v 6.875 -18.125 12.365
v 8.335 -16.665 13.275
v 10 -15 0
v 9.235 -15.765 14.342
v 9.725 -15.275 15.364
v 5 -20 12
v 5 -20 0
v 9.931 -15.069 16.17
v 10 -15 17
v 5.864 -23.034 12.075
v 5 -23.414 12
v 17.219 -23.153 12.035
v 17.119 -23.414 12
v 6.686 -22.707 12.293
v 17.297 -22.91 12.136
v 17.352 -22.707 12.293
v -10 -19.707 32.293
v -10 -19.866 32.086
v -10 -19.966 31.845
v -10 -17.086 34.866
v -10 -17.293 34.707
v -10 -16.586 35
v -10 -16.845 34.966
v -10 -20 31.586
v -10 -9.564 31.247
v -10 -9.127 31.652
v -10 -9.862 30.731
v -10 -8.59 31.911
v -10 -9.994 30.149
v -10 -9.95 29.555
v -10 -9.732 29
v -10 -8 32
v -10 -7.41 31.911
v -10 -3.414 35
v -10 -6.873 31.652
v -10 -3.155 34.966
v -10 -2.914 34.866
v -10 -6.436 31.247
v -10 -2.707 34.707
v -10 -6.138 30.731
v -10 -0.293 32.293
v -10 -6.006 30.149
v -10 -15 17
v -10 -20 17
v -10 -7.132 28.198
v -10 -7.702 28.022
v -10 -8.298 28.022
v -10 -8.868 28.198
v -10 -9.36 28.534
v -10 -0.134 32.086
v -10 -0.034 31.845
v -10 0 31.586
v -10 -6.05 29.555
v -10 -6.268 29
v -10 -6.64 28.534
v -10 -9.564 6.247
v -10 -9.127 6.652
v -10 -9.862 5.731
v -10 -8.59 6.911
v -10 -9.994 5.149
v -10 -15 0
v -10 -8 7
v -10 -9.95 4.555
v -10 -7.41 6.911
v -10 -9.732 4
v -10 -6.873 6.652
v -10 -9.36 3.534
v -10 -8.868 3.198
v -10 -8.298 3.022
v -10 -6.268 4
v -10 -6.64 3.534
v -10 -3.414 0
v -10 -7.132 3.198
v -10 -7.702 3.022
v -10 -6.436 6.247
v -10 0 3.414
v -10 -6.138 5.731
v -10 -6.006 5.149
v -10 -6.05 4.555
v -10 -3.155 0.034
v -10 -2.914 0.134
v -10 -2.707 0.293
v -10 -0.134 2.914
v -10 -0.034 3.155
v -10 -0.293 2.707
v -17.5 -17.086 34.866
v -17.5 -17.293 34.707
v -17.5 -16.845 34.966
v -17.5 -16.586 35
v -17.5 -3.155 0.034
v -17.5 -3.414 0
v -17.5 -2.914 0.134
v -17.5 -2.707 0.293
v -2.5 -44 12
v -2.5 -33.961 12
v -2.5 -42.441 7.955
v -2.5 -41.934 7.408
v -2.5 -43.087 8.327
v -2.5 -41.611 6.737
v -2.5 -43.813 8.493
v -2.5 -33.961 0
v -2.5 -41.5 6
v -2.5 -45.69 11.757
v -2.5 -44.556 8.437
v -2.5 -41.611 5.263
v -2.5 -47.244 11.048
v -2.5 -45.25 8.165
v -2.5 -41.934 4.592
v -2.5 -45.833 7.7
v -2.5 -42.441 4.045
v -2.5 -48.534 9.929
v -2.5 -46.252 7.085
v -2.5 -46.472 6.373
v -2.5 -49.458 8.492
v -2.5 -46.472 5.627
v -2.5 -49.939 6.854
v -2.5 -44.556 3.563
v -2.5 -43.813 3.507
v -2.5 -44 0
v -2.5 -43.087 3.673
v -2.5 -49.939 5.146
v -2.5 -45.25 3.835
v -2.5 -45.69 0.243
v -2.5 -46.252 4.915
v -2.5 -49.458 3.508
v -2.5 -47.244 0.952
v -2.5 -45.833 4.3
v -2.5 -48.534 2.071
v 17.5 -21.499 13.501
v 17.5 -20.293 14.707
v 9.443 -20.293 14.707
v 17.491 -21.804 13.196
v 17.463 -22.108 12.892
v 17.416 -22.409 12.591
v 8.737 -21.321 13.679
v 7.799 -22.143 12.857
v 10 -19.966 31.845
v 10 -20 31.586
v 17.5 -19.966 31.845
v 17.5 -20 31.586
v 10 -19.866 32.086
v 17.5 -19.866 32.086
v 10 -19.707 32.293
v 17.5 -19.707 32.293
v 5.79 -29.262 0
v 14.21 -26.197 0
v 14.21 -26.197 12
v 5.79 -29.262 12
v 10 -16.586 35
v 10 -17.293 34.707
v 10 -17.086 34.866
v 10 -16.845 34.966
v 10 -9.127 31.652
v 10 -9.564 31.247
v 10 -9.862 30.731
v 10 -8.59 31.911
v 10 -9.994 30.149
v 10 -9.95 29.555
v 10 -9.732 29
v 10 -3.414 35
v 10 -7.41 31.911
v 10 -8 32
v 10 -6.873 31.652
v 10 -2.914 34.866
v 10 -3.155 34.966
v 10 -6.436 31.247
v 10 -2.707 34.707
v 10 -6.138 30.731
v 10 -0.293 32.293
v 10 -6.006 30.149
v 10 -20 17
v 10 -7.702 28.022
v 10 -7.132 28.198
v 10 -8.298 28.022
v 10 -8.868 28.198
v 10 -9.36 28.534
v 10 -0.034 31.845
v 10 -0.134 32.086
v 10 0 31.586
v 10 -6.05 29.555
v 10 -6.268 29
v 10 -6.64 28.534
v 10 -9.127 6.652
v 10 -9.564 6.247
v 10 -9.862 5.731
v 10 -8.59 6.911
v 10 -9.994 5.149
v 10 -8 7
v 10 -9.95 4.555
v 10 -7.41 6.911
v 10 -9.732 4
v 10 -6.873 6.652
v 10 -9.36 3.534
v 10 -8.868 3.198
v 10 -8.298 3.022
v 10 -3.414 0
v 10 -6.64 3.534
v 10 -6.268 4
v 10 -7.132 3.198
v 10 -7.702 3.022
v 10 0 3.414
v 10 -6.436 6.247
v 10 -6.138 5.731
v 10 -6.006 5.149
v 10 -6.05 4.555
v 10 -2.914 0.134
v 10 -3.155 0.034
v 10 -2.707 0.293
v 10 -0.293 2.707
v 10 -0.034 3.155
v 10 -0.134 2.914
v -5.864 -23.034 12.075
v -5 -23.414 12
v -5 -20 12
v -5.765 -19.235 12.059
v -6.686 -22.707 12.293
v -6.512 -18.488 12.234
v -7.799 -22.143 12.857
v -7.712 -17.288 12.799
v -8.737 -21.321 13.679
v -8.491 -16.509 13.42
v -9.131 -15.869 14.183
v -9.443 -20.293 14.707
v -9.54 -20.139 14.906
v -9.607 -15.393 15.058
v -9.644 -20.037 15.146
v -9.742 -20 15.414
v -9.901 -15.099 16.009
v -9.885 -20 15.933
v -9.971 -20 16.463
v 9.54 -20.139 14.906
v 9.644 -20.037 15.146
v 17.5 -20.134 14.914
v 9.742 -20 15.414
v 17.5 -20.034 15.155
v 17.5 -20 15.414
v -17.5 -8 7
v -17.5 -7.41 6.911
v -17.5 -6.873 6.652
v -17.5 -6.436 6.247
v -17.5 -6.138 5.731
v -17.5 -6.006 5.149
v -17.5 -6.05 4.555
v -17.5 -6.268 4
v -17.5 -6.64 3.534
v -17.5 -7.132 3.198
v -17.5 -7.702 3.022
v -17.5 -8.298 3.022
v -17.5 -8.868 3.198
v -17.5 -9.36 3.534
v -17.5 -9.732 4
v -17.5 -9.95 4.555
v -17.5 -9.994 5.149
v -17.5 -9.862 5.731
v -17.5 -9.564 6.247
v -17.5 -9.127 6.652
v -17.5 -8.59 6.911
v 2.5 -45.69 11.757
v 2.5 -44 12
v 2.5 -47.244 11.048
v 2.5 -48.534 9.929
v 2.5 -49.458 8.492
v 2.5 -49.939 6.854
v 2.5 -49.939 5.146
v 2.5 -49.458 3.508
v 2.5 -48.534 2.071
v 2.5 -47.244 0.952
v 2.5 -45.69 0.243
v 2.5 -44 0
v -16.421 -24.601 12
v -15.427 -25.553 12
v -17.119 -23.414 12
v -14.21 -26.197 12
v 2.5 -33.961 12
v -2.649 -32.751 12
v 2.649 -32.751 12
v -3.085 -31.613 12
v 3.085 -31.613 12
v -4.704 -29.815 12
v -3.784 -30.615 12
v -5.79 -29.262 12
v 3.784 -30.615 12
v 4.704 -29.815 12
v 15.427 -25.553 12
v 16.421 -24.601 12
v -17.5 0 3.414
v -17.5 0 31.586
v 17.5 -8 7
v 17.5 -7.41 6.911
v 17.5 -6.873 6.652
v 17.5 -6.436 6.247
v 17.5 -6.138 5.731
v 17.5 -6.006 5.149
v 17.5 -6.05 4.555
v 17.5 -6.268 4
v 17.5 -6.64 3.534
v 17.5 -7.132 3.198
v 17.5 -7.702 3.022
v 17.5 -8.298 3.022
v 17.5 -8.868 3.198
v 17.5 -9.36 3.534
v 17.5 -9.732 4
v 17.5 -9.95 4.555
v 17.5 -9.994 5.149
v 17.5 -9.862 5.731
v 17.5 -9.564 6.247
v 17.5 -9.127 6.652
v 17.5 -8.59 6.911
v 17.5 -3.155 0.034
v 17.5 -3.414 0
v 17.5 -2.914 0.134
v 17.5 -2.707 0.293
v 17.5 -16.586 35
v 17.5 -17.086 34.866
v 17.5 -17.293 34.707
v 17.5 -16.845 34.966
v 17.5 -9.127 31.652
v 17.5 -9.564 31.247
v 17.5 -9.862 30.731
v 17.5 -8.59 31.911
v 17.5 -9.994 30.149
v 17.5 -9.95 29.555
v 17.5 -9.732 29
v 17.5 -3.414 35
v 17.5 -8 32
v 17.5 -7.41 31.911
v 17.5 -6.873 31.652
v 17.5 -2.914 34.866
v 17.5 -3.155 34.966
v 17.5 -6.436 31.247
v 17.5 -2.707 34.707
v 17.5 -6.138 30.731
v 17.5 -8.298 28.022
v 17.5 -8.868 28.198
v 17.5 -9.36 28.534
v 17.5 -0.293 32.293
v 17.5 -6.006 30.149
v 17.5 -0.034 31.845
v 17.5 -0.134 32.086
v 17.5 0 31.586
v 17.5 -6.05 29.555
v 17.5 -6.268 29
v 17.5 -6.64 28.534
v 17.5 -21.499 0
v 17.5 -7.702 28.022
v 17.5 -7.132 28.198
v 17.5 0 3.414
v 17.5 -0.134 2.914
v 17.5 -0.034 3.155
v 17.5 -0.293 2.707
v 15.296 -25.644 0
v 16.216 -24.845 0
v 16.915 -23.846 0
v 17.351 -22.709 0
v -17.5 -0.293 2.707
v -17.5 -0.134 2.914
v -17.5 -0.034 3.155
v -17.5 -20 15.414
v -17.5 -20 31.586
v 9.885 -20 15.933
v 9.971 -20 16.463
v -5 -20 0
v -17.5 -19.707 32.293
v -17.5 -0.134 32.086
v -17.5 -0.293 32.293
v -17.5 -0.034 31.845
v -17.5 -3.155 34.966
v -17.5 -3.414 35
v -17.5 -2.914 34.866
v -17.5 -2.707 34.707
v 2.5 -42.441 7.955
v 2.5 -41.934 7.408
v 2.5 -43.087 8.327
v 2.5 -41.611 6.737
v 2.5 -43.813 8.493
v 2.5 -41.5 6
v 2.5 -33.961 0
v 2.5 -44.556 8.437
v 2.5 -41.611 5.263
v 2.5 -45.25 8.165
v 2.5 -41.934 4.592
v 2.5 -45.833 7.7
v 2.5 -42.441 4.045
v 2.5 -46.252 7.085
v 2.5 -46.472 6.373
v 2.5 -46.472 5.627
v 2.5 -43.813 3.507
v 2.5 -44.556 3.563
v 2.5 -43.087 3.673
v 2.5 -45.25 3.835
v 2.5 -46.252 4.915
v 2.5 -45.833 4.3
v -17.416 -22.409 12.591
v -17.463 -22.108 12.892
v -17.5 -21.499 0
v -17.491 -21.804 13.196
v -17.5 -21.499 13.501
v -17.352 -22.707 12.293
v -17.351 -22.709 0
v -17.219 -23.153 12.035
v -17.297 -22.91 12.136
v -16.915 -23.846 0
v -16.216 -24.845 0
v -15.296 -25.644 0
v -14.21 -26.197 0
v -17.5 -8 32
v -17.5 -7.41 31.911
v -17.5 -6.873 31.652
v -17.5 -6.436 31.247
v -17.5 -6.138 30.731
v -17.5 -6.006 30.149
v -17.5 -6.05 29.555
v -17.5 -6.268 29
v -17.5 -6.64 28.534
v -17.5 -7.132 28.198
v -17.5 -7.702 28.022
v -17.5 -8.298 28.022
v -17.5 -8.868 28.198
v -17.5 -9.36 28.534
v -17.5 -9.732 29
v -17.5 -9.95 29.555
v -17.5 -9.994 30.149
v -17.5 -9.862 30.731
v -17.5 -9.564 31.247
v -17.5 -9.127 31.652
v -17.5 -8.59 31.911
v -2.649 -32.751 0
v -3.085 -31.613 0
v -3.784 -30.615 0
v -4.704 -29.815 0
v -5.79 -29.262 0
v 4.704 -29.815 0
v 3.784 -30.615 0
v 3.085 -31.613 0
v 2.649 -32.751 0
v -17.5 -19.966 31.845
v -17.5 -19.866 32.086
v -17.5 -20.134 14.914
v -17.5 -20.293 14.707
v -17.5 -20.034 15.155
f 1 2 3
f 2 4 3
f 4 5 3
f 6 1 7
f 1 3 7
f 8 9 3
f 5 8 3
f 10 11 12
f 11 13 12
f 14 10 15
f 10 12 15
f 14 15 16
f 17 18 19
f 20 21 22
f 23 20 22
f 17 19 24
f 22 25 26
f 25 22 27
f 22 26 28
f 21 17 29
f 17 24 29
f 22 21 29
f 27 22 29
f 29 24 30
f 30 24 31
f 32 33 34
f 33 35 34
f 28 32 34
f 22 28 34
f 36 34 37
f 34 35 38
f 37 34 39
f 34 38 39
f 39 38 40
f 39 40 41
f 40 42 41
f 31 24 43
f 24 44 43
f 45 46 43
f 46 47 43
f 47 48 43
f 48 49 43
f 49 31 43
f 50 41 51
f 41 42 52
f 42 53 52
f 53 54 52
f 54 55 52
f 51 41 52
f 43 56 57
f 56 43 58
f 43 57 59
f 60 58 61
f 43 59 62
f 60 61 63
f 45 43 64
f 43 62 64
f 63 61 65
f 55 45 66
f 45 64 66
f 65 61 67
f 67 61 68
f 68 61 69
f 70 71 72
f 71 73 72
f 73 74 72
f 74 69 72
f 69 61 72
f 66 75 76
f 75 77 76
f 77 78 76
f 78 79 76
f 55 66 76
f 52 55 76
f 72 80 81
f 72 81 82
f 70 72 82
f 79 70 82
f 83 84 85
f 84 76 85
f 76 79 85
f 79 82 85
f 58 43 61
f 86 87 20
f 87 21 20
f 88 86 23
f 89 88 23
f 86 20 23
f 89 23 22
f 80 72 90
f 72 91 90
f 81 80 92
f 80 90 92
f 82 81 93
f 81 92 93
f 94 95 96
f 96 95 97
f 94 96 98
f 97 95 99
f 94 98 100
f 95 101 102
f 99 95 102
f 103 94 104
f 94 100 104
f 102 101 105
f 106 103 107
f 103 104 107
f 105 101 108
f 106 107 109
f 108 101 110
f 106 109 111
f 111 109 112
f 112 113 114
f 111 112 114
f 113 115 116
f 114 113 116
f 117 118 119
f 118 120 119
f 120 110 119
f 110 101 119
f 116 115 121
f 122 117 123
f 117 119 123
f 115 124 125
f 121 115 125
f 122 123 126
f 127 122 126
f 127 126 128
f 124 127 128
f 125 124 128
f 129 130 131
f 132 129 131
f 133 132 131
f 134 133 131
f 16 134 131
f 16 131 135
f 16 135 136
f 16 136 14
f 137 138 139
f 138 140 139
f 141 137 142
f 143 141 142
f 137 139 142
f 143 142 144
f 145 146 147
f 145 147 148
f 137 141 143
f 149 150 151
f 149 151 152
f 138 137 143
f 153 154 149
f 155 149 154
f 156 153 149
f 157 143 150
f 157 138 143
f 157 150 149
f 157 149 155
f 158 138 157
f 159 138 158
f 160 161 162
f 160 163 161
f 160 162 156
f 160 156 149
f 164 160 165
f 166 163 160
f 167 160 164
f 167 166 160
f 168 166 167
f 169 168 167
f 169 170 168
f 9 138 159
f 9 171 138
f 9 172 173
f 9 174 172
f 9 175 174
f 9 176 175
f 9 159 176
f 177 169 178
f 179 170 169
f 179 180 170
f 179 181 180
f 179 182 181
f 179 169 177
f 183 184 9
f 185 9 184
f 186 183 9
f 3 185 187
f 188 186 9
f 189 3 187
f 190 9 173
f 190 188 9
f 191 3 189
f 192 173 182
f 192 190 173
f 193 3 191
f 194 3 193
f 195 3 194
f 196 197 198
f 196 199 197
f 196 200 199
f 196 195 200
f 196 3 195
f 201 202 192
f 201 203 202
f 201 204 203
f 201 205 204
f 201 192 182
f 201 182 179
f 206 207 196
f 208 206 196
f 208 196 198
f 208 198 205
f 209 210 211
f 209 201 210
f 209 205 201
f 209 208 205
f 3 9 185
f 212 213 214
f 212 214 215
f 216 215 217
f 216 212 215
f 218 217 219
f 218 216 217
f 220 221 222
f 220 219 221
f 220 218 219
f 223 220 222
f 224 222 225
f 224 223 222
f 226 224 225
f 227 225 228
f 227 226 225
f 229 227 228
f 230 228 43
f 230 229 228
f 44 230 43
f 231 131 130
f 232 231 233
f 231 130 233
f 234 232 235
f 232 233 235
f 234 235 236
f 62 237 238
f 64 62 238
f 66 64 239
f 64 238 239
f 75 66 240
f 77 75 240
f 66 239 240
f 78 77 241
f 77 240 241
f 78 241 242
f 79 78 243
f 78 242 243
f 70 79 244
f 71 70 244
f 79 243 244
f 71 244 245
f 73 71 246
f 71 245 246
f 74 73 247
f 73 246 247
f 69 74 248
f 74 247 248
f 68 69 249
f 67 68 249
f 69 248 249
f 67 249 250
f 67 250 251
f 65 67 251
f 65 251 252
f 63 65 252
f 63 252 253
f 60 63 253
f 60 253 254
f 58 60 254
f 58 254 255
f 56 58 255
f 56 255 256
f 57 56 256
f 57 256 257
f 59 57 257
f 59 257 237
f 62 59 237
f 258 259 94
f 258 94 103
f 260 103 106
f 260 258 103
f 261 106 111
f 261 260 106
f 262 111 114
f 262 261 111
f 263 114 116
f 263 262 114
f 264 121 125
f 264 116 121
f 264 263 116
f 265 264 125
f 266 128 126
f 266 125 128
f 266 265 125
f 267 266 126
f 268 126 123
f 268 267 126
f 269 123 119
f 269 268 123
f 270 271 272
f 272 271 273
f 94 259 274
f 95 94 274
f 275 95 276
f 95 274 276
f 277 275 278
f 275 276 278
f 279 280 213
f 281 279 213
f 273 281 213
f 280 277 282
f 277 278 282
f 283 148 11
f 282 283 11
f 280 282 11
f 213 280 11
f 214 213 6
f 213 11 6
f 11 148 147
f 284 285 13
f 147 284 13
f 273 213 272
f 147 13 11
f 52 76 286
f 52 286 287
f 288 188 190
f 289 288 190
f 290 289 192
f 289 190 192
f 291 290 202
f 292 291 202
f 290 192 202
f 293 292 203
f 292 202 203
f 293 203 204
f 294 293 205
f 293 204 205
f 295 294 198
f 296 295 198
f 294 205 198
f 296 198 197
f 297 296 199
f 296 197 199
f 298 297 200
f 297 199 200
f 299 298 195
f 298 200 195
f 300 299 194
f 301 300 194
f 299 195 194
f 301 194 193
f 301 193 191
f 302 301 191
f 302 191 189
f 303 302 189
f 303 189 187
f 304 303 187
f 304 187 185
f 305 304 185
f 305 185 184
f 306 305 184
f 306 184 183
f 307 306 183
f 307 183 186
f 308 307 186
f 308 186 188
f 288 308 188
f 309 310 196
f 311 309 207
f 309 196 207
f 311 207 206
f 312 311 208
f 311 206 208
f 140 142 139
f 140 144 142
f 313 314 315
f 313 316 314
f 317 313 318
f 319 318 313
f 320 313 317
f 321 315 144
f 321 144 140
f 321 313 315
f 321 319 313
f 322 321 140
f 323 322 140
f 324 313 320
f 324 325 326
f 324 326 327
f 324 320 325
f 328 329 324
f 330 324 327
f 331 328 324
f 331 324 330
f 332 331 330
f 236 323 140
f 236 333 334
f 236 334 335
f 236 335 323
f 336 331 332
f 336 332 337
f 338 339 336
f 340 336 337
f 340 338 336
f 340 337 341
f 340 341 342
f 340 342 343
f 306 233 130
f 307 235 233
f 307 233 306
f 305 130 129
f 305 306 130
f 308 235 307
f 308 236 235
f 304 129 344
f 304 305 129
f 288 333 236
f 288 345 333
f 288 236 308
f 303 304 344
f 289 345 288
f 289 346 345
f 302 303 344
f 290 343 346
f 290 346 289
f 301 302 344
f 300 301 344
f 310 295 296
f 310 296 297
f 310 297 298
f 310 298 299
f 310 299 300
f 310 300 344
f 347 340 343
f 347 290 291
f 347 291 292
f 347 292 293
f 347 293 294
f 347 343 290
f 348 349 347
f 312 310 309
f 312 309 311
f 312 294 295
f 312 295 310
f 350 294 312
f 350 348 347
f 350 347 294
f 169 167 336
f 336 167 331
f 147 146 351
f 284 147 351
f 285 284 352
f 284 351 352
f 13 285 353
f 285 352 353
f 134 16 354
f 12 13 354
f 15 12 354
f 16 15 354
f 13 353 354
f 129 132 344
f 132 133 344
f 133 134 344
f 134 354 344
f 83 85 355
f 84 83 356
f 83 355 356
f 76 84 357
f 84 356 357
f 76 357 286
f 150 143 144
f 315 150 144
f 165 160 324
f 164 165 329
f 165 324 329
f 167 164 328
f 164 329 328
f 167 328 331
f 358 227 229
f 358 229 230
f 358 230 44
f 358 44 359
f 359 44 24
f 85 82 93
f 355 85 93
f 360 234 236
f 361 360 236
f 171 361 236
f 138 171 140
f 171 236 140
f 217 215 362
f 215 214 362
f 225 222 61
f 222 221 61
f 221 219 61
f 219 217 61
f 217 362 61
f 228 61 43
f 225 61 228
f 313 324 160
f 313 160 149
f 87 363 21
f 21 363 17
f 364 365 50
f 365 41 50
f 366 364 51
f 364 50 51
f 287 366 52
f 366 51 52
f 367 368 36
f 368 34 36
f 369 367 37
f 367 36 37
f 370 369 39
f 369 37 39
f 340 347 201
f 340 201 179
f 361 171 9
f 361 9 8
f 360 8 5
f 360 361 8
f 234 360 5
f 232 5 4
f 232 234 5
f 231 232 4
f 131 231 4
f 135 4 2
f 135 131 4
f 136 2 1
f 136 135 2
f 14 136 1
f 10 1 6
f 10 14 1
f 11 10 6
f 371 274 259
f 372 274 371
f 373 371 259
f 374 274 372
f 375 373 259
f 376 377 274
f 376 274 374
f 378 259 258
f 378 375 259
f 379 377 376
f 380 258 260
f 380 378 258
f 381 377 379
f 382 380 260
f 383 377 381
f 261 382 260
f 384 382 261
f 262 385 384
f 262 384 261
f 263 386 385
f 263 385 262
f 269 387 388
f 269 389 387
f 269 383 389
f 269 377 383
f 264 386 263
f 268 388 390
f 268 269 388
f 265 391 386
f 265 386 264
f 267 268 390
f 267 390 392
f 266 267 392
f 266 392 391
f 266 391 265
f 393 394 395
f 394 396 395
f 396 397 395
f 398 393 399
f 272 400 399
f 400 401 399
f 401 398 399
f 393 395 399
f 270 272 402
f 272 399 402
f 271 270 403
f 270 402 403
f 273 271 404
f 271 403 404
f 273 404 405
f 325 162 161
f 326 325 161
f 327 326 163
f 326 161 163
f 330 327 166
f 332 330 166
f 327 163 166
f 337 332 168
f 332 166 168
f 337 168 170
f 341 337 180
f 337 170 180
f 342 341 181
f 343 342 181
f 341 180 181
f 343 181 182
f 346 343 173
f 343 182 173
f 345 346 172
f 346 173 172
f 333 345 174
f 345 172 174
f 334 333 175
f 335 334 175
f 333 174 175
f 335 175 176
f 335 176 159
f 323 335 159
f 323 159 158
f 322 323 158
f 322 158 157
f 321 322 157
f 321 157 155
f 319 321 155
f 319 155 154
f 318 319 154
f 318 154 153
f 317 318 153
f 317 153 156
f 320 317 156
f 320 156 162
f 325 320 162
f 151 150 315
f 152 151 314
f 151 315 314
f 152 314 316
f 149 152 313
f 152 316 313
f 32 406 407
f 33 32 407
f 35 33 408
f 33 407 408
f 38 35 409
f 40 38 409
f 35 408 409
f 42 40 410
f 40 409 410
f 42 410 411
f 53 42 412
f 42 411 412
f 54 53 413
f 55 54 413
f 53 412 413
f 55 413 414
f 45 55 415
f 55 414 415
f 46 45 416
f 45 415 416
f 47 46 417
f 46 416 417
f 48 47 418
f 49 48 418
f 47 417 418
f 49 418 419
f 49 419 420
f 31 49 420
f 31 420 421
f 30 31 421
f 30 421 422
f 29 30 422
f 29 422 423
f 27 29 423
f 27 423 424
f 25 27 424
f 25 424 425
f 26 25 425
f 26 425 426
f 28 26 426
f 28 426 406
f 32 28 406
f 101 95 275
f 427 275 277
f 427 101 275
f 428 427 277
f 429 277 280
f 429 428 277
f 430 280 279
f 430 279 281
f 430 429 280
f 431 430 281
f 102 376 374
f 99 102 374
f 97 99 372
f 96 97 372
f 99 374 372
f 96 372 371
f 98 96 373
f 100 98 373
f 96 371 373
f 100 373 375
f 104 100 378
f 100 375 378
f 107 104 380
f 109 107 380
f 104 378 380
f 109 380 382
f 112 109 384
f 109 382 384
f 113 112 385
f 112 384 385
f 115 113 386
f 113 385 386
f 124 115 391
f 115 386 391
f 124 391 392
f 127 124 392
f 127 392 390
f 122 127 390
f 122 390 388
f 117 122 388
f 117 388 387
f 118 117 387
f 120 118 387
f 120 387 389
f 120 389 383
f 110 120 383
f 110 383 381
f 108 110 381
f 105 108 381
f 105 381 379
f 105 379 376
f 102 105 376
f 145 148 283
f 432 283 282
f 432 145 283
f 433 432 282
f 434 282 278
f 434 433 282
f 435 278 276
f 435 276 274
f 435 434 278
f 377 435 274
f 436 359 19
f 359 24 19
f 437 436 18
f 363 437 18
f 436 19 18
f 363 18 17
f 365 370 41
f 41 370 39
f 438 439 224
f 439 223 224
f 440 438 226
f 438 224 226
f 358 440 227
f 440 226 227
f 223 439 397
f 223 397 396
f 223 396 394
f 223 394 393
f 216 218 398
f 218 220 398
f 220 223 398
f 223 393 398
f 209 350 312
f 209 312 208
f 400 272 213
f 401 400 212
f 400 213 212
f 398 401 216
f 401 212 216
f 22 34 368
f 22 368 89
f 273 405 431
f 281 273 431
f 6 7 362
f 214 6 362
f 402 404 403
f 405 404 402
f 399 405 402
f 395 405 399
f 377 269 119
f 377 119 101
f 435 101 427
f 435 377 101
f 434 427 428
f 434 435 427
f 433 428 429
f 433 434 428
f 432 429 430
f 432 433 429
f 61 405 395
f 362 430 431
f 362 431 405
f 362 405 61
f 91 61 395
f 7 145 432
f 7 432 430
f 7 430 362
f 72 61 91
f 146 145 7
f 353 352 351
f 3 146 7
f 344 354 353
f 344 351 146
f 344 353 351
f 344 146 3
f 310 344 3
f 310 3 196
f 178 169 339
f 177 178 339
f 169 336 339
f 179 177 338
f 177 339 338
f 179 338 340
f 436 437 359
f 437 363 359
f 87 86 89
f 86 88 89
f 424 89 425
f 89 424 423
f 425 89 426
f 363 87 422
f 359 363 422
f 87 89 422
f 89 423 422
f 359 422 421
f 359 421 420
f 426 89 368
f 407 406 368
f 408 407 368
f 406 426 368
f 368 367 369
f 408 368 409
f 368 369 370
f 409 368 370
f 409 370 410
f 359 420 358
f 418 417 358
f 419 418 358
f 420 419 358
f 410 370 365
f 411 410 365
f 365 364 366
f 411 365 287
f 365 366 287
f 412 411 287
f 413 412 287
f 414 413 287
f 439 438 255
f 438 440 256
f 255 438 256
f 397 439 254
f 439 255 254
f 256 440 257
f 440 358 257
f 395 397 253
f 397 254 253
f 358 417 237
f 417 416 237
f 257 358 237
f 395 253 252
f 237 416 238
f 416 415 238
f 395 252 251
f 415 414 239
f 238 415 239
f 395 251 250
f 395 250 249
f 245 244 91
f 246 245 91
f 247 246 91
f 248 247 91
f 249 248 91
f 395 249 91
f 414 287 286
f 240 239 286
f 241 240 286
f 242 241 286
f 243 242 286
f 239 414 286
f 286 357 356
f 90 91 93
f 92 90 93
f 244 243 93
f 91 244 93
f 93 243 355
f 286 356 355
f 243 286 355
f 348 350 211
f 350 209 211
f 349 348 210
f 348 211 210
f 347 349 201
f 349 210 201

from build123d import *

# Parameters (mm, degrees)
BOSS_EXTRUDE1_DEPTH = 17.5
SKETCH2_W           = 20
SKETCH2_H           = 20
CUT_EXTRUDE1_DEPTH  = 64.492125496
SKETCH3_R           = 2
CUT_EXTRUDE2_DEPTH  = 71.356236397
CHAMFER1_SIZE       = 3
CHAMFER2_SIZE       = 5
FILLET1_RADIUS      = 6
FILLET1_LENGTH      = 5
SKETCH4_R           = 2.5
CUT_EXTRUDE3_DEPTH  = 35
FILLET2_R           = 5
FILLET3_R           = 1


with BuildPart() as part:
    # Sketch1 → Boss-Extrude1 (new, symmetric)
    with BuildSketch(Plane(origin=(0, 0, 0), x_dir=(0, 0, -1), z_dir=(1, 0, 0))):
        Polygon((0, 0), (-35, 0), (-35, -20), (-12, -20), (-12, -50), (0, -50), align=None)
    extrude(amount=BOSS_EXTRUDE1_DEPTH, both=True)

    # Sketch2 → Cut-Extrude1 (cut, through all)
    with BuildSketch(Plane(origin=(0, 0, 0), x_dir=(-1, 0, 0), z_dir=(0, 0, -1))):
        Polygon((17.5, -25), (2.5, -30.459553514), (2.5, -50), (17.5, -50), align=None)
        Polygon((-17.5, -50), (-17.5, -25), (-2.5, -30.459553514), (-2.5, -50), align=None)
        with Locations((0, -10)):
            Rectangle(SKETCH2_W, SKETCH2_H)
    extrude(amount=-CUT_EXTRUDE1_DEPTH, mode=Mode.SUBTRACT)

    # Sketch3 → Cut-Extrude2 (cut, through all)
    with BuildSketch(Plane.ZY.offset(17.5)):
        with Locations((5, -8)):
            Circle(SKETCH3_R)
        with Locations((30, -8)):
            Circle(SKETCH3_R)
    extrude(amount=-CUT_EXTRUDE2_DEPTH, mode=Mode.SUBTRACT)

    # Chamfer1
    chamfer1_edges = [part.edges().sort_by_distance(p)[0] for p in [
        (13.75, -20, 12),
        (13.75, -20, 35),
        (13.75, 0, 35),
        (13.75, 0, 0),
        (-13.75, -20, 12),
        (-13.75, -20, 35),
        (-13.75, 0, 35),
        (-13.75, 0, 0),
    ]]
    chamfer(chamfer1_edges, length=CHAMFER1_SIZE)

    # Chamfer2
    chamfer2_edges = [part.edges().sort_by_distance(p)[0] for p in [
        (-10, -20, 6),
        (10, -20, 6),
    ]]
    chamfer(chamfer2_edges, length=CHAMFER2_SIZE)

    # Fillet1: full round fillet: the end face becomes a half cylinder, R = half its width
    fillet1_face = Plane((0, -50, 6), x_dir=(1, 0, 0), z_dir=(0, -1, 0))  # on the end face: x along it, z out of the body
    fillet1_slab = fillet1_face.offset(-FILLET1_RADIUS / 2) * Box(FILLET1_LENGTH, 2 * FILLET1_RADIUS, FILLET1_RADIUS, mode=Mode.PRIVATE)  # the body's end, R deep
    fillet1_round = Plane((0, -44, 6), x_dir=(0, -1, 0), z_dir=(1, 0, 0)) * Cylinder(FILLET1_RADIUS, FILLET1_LENGTH, mode=Mode.PRIVATE)  # its axis R under the face
    add(fillet1_slab - fillet1_round, mode=Mode.SUBTRACT)

    # Sketch4 → Cut-Extrude3 (cut)
    with BuildSketch(Plane(origin=(2.5, 0, 0), x_dir=(0, 0, -1), z_dir=(1, 0, 0))):
        with Locations(Location((-6, -44, 0), (0, 0, 90))):
            Circle(SKETCH4_R)
    extrude(amount=-CUT_EXTRUDE3_DEPTH, mode=Mode.SUBTRACT)

    # Fillet2
    # the kernel refuses this fillet: 5 mm, written as the material it adds along each edge
    with BuildSketch(Plane(origin=(10, -35.5, 12), x_dir=(-1, 0, 0), z_dir=(0, 1, 0))) as fillet2_piece_1_section:
        with BuildLine():
            CenterArc((FILLET2_R, FILLET2_R), FILLET2_R, 180, 90)
            Line((0, FILLET2_R), (0, 0))
            Line((0, 0), (FILLET2_R, 0))
        make_face()
    fillet2_piece_1 = extrude(amount=33, mode=Mode.PRIVATE)
    fillet2_piece_1 = split(fillet2_piece_1, bisect_by=Plane(origin=(9.996559124, -19.16276417, 15.83723583), z_dir=(0, -0.7071067811865476, 0.7071067811865476)), keep=Keep.TOP, mode=Mode.PRIVATE)
    fillet2_piece_1 = split(fillet2_piece_1, bisect_by=Plane(origin=(9.996559124, -20, 16.11631444), z_dir=(0, 1, 0)), keep=Keep.TOP, mode=Mode.PRIVATE)
    add(fillet2_piece_1)
    with BuildSketch(Plane(origin=(10, -35.5, 12), x_dir=(-1, 0, 0), z_dir=(0, 1, 0))) as fillet2_piece_2_section:
        with BuildLine():
            CenterArc((FILLET2_R, FILLET2_R), FILLET2_R, 180, 90)
            Line((0, FILLET2_R), (0, 0))
            Line((0, 0), (FILLET2_R, 0))
        make_face()
    fillet2_piece_2 = extrude(amount=33, mode=Mode.PRIVATE)
    fillet2_piece_2 = split(fillet2_piece_2, bisect_by=Plane(origin=(8.541566655, -21.793394373, 13.206605627), z_dir=(0, 0.7071067811865476, -0.7071067811865476)), keep=Keep.TOP, mode=Mode.PRIVATE)
    fillet2_piece_2 = split(fillet2_piece_2, bisect_by=Plane(origin=(8.541566655, -20, 12.608807503), z_dir=(0, -1, 0)), keep=Keep.TOP, mode=Mode.PRIVATE)
    add(fillet2_piece_2)
    with BuildSketch(Plane(origin=(10, -35.5, 12), x_dir=(-1, 0, 0), z_dir=(0, 1, 0))) as fillet2_piece_3_section:
        with BuildLine():
            CenterArc((FILLET2_R, FILLET2_R), FILLET2_R, 180, 90)
            Line((0, FILLET2_R), (0, 0))
            Line((0, 0), (FILLET2_R, 0))
        make_face()
    fillet2_piece_3 = extrude(amount=33, mode=Mode.PRIVATE)
    fillet2_piece_3 = split(fillet2_piece_3, bisect_by=Plane(origin=(8.131124987, -16.868875013, 13.270711332), z_dir=(0.7071067811865476, -0.7071067811865476, 0)), keep=Keep.TOP, mode=Mode.PRIVATE)
    fillet2_piece_3 = split(fillet2_piece_3, bisect_by=Plane(origin=(9.156989341, -19.812014017, 15.187985983), z_dir=(0, 0.7071067811865476, -0.7071067811865476)), keep=Keep.TOP, mode=Mode.PRIVATE)
    fillet2_piece_3 = split(fillet2_piece_3, bisect_by=Plane(origin=(9.156989341, -20, 13.270711332), z_dir=(0, 1, 0)), keep=Keep.TOP, mode=Mode.PRIVATE)
    add(fillet2_piece_3)
    with BuildSketch(Plane(origin=(-10, -35.5, 12), x_dir=(0, 0, 1), z_dir=(0, 1, 0))) as fillet2_piece_4_section:
        with BuildLine():
            CenterArc((FILLET2_R, FILLET2_R), FILLET2_R, 180, 90)
            Line((0, FILLET2_R), (0, 0))
            Line((0, 0), (FILLET2_R, 0))
        make_face()
    fillet2_piece_4 = extrude(amount=33, mode=Mode.PRIVATE)
    fillet2_piece_4 = split(fillet2_piece_4, bisect_by=Plane(origin=(-8.541566654, -21.793394373, 13.206605627), z_dir=(0, 0.7071067811865476, -0.7071067811865476)), keep=Keep.TOP, mode=Mode.PRIVATE)
    fillet2_piece_4 = split(fillet2_piece_4, bisect_by=Plane(origin=(-8.541566654, -20, 12.608807503), z_dir=(0, -1, 0)), keep=Keep.TOP, mode=Mode.PRIVATE)
    add(fillet2_piece_4)
    with BuildSketch(Plane(origin=(-10, -35.5, 12), x_dir=(0, 0, 1), z_dir=(0, 1, 0))) as fillet2_piece_5_section:
        with BuildLine():
            CenterArc((FILLET2_R, FILLET2_R), FILLET2_R, 180, 90)
            Line((0, FILLET2_R), (0, 0))
            Line((0, 0), (FILLET2_R, 0))
        make_face()
    fillet2_piece_5 = extrude(amount=33, mode=Mode.PRIVATE)
    fillet2_piece_5 = split(fillet2_piece_5, bisect_by=Plane(origin=(-9.996559123, -19.16276417, 15.83723583), z_dir=(0, -0.7071067811865476, 0.7071067811865476)), keep=Keep.TOP, mode=Mode.PRIVATE)
    fillet2_piece_5 = split(fillet2_piece_5, bisect_by=Plane(origin=(-9.996559123, -20, 16.11631444), z_dir=(0, 1, 0)), keep=Keep.TOP, mode=Mode.PRIVATE)
    add(fillet2_piece_5)
    with BuildSketch(Plane(origin=(-10, -35.5, 12), x_dir=(0, 0, 1), z_dir=(0, 1, 0))) as fillet2_piece_6_section:
        with BuildLine():
            CenterArc((FILLET2_R, FILLET2_R), FILLET2_R, 180, 90)
            Line((0, FILLET2_R), (0, 0))
            Line((0, 0), (FILLET2_R, 0))
        make_face()
    fillet2_piece_6 = extrude(amount=33, mode=Mode.PRIVATE)
    fillet2_piece_6 = split(fillet2_piece_6, bisect_by=Plane(origin=(-9.156989342, -19.812014017, 15.187985983), z_dir=(0, 0.7071067811865476, -0.7071067811865476)), keep=Keep.TOP, mode=Mode.PRIVATE)
    fillet2_piece_6 = split(fillet2_piece_6, bisect_by=Plane(origin=(-8.131124988, -16.868875012, 13.270711332), z_dir=(-0.7071067811865476, -0.7071067811865476, 0)), keep=Keep.TOP, mode=Mode.PRIVATE)
    fillet2_piece_6 = split(fillet2_piece_6, bisect_by=Plane(origin=(-9.156989342, -20, 13.270711332), z_dir=(0, 1, 0)), keep=Keep.TOP, mode=Mode.PRIVATE)
    add(fillet2_piece_6)
    with BuildSketch(Plane(origin=(2.5, -30.459553514, 0), x_dir=(0, -1, 0), z_dir=(0, 0, 1)), Plane(origin=(-2.5, -30.459553514, 0), x_dir=(-0.9396926207859091, 0.34202014332566677, 0), z_dir=(0, 0, 1))) as fillet2_piece_7:
        with BuildLine():
            CenterArc((FILLET2_R * 0.70020753821, FILLET2_R), FILLET2_R, 200, 70)
            Line((-FILLET2_R * 0.239485082576, FILLET2_R * 0.657979856674), (0, 0))
            Line((0, 0), (FILLET2_R * 0.70020753821, 0))
        make_face()
    extrude(amount=12)
    # the kernel refuses this fillet: 5 mm, written as the material it takes off along each edge
    with BuildSketch(Plane(origin=(17.5, -25, -8.752594228), x_dir=(0, 1, 0), z_dir=(0, 0, 1))) as fillet2_2_piece_1:
        with BuildLine():
            CenterArc((FILLET2_R * 0.70020753821, FILLET2_R), FILLET2_R, 200, 70)
            Line((-FILLET2_R * 0.239485082576, FILLET2_R * 0.657979856674), (0, 0))
            Line((0, 0), (FILLET2_R * 0.70020753821, 0))
        make_face()
    extrude(amount=29.505188455, mode=Mode.SUBTRACT)
    with BuildSketch(Plane(origin=(-17.5, -25, -8.752594228), x_dir=(0, 1, 0), z_dir=(0, 0, 1))) as fillet2_2_piece_2:
        with BuildLine():
            CenterArc((FILLET2_R * 0.70020753821, -FILLET2_R), FILLET2_R, 90, 70)
            Line((-FILLET2_R * 0.239485082576, -FILLET2_R * 0.657979856674), (0, 0))
            Line((0, 0), (FILLET2_R * 0.70020753821, 0))
        make_face()
    extrude(amount=29.505188455, mode=Mode.SUBTRACT)

    # Fillet3
    fillet3_edges = [part.edges().sort_by_distance(p)[0] for p in [
        (11.134684772, -23, 12),
        (13.541287847, -20, 15),
        (13.75, -20, 32),
        (13.75, -17, 35),
        (13.75, 0, 32),
        (13.75, 0, 3),
        (13.75, -3, 0),
        (13.75, -3, 35),
        (-13.75, -20, 32),
        (-13.541287847, -20, 15),
        (-11.134684772, -23, 12),
        (-13.75, -3, 0),
        (-13.75, 0, 3),
        (-13.75, 0, 32),
        (-13.75, -3, 35),
        (-13.75, -17, 35),
    ]]
    fillet(fillet3_edges, radius=FILLET3_R)


solid = part.part
